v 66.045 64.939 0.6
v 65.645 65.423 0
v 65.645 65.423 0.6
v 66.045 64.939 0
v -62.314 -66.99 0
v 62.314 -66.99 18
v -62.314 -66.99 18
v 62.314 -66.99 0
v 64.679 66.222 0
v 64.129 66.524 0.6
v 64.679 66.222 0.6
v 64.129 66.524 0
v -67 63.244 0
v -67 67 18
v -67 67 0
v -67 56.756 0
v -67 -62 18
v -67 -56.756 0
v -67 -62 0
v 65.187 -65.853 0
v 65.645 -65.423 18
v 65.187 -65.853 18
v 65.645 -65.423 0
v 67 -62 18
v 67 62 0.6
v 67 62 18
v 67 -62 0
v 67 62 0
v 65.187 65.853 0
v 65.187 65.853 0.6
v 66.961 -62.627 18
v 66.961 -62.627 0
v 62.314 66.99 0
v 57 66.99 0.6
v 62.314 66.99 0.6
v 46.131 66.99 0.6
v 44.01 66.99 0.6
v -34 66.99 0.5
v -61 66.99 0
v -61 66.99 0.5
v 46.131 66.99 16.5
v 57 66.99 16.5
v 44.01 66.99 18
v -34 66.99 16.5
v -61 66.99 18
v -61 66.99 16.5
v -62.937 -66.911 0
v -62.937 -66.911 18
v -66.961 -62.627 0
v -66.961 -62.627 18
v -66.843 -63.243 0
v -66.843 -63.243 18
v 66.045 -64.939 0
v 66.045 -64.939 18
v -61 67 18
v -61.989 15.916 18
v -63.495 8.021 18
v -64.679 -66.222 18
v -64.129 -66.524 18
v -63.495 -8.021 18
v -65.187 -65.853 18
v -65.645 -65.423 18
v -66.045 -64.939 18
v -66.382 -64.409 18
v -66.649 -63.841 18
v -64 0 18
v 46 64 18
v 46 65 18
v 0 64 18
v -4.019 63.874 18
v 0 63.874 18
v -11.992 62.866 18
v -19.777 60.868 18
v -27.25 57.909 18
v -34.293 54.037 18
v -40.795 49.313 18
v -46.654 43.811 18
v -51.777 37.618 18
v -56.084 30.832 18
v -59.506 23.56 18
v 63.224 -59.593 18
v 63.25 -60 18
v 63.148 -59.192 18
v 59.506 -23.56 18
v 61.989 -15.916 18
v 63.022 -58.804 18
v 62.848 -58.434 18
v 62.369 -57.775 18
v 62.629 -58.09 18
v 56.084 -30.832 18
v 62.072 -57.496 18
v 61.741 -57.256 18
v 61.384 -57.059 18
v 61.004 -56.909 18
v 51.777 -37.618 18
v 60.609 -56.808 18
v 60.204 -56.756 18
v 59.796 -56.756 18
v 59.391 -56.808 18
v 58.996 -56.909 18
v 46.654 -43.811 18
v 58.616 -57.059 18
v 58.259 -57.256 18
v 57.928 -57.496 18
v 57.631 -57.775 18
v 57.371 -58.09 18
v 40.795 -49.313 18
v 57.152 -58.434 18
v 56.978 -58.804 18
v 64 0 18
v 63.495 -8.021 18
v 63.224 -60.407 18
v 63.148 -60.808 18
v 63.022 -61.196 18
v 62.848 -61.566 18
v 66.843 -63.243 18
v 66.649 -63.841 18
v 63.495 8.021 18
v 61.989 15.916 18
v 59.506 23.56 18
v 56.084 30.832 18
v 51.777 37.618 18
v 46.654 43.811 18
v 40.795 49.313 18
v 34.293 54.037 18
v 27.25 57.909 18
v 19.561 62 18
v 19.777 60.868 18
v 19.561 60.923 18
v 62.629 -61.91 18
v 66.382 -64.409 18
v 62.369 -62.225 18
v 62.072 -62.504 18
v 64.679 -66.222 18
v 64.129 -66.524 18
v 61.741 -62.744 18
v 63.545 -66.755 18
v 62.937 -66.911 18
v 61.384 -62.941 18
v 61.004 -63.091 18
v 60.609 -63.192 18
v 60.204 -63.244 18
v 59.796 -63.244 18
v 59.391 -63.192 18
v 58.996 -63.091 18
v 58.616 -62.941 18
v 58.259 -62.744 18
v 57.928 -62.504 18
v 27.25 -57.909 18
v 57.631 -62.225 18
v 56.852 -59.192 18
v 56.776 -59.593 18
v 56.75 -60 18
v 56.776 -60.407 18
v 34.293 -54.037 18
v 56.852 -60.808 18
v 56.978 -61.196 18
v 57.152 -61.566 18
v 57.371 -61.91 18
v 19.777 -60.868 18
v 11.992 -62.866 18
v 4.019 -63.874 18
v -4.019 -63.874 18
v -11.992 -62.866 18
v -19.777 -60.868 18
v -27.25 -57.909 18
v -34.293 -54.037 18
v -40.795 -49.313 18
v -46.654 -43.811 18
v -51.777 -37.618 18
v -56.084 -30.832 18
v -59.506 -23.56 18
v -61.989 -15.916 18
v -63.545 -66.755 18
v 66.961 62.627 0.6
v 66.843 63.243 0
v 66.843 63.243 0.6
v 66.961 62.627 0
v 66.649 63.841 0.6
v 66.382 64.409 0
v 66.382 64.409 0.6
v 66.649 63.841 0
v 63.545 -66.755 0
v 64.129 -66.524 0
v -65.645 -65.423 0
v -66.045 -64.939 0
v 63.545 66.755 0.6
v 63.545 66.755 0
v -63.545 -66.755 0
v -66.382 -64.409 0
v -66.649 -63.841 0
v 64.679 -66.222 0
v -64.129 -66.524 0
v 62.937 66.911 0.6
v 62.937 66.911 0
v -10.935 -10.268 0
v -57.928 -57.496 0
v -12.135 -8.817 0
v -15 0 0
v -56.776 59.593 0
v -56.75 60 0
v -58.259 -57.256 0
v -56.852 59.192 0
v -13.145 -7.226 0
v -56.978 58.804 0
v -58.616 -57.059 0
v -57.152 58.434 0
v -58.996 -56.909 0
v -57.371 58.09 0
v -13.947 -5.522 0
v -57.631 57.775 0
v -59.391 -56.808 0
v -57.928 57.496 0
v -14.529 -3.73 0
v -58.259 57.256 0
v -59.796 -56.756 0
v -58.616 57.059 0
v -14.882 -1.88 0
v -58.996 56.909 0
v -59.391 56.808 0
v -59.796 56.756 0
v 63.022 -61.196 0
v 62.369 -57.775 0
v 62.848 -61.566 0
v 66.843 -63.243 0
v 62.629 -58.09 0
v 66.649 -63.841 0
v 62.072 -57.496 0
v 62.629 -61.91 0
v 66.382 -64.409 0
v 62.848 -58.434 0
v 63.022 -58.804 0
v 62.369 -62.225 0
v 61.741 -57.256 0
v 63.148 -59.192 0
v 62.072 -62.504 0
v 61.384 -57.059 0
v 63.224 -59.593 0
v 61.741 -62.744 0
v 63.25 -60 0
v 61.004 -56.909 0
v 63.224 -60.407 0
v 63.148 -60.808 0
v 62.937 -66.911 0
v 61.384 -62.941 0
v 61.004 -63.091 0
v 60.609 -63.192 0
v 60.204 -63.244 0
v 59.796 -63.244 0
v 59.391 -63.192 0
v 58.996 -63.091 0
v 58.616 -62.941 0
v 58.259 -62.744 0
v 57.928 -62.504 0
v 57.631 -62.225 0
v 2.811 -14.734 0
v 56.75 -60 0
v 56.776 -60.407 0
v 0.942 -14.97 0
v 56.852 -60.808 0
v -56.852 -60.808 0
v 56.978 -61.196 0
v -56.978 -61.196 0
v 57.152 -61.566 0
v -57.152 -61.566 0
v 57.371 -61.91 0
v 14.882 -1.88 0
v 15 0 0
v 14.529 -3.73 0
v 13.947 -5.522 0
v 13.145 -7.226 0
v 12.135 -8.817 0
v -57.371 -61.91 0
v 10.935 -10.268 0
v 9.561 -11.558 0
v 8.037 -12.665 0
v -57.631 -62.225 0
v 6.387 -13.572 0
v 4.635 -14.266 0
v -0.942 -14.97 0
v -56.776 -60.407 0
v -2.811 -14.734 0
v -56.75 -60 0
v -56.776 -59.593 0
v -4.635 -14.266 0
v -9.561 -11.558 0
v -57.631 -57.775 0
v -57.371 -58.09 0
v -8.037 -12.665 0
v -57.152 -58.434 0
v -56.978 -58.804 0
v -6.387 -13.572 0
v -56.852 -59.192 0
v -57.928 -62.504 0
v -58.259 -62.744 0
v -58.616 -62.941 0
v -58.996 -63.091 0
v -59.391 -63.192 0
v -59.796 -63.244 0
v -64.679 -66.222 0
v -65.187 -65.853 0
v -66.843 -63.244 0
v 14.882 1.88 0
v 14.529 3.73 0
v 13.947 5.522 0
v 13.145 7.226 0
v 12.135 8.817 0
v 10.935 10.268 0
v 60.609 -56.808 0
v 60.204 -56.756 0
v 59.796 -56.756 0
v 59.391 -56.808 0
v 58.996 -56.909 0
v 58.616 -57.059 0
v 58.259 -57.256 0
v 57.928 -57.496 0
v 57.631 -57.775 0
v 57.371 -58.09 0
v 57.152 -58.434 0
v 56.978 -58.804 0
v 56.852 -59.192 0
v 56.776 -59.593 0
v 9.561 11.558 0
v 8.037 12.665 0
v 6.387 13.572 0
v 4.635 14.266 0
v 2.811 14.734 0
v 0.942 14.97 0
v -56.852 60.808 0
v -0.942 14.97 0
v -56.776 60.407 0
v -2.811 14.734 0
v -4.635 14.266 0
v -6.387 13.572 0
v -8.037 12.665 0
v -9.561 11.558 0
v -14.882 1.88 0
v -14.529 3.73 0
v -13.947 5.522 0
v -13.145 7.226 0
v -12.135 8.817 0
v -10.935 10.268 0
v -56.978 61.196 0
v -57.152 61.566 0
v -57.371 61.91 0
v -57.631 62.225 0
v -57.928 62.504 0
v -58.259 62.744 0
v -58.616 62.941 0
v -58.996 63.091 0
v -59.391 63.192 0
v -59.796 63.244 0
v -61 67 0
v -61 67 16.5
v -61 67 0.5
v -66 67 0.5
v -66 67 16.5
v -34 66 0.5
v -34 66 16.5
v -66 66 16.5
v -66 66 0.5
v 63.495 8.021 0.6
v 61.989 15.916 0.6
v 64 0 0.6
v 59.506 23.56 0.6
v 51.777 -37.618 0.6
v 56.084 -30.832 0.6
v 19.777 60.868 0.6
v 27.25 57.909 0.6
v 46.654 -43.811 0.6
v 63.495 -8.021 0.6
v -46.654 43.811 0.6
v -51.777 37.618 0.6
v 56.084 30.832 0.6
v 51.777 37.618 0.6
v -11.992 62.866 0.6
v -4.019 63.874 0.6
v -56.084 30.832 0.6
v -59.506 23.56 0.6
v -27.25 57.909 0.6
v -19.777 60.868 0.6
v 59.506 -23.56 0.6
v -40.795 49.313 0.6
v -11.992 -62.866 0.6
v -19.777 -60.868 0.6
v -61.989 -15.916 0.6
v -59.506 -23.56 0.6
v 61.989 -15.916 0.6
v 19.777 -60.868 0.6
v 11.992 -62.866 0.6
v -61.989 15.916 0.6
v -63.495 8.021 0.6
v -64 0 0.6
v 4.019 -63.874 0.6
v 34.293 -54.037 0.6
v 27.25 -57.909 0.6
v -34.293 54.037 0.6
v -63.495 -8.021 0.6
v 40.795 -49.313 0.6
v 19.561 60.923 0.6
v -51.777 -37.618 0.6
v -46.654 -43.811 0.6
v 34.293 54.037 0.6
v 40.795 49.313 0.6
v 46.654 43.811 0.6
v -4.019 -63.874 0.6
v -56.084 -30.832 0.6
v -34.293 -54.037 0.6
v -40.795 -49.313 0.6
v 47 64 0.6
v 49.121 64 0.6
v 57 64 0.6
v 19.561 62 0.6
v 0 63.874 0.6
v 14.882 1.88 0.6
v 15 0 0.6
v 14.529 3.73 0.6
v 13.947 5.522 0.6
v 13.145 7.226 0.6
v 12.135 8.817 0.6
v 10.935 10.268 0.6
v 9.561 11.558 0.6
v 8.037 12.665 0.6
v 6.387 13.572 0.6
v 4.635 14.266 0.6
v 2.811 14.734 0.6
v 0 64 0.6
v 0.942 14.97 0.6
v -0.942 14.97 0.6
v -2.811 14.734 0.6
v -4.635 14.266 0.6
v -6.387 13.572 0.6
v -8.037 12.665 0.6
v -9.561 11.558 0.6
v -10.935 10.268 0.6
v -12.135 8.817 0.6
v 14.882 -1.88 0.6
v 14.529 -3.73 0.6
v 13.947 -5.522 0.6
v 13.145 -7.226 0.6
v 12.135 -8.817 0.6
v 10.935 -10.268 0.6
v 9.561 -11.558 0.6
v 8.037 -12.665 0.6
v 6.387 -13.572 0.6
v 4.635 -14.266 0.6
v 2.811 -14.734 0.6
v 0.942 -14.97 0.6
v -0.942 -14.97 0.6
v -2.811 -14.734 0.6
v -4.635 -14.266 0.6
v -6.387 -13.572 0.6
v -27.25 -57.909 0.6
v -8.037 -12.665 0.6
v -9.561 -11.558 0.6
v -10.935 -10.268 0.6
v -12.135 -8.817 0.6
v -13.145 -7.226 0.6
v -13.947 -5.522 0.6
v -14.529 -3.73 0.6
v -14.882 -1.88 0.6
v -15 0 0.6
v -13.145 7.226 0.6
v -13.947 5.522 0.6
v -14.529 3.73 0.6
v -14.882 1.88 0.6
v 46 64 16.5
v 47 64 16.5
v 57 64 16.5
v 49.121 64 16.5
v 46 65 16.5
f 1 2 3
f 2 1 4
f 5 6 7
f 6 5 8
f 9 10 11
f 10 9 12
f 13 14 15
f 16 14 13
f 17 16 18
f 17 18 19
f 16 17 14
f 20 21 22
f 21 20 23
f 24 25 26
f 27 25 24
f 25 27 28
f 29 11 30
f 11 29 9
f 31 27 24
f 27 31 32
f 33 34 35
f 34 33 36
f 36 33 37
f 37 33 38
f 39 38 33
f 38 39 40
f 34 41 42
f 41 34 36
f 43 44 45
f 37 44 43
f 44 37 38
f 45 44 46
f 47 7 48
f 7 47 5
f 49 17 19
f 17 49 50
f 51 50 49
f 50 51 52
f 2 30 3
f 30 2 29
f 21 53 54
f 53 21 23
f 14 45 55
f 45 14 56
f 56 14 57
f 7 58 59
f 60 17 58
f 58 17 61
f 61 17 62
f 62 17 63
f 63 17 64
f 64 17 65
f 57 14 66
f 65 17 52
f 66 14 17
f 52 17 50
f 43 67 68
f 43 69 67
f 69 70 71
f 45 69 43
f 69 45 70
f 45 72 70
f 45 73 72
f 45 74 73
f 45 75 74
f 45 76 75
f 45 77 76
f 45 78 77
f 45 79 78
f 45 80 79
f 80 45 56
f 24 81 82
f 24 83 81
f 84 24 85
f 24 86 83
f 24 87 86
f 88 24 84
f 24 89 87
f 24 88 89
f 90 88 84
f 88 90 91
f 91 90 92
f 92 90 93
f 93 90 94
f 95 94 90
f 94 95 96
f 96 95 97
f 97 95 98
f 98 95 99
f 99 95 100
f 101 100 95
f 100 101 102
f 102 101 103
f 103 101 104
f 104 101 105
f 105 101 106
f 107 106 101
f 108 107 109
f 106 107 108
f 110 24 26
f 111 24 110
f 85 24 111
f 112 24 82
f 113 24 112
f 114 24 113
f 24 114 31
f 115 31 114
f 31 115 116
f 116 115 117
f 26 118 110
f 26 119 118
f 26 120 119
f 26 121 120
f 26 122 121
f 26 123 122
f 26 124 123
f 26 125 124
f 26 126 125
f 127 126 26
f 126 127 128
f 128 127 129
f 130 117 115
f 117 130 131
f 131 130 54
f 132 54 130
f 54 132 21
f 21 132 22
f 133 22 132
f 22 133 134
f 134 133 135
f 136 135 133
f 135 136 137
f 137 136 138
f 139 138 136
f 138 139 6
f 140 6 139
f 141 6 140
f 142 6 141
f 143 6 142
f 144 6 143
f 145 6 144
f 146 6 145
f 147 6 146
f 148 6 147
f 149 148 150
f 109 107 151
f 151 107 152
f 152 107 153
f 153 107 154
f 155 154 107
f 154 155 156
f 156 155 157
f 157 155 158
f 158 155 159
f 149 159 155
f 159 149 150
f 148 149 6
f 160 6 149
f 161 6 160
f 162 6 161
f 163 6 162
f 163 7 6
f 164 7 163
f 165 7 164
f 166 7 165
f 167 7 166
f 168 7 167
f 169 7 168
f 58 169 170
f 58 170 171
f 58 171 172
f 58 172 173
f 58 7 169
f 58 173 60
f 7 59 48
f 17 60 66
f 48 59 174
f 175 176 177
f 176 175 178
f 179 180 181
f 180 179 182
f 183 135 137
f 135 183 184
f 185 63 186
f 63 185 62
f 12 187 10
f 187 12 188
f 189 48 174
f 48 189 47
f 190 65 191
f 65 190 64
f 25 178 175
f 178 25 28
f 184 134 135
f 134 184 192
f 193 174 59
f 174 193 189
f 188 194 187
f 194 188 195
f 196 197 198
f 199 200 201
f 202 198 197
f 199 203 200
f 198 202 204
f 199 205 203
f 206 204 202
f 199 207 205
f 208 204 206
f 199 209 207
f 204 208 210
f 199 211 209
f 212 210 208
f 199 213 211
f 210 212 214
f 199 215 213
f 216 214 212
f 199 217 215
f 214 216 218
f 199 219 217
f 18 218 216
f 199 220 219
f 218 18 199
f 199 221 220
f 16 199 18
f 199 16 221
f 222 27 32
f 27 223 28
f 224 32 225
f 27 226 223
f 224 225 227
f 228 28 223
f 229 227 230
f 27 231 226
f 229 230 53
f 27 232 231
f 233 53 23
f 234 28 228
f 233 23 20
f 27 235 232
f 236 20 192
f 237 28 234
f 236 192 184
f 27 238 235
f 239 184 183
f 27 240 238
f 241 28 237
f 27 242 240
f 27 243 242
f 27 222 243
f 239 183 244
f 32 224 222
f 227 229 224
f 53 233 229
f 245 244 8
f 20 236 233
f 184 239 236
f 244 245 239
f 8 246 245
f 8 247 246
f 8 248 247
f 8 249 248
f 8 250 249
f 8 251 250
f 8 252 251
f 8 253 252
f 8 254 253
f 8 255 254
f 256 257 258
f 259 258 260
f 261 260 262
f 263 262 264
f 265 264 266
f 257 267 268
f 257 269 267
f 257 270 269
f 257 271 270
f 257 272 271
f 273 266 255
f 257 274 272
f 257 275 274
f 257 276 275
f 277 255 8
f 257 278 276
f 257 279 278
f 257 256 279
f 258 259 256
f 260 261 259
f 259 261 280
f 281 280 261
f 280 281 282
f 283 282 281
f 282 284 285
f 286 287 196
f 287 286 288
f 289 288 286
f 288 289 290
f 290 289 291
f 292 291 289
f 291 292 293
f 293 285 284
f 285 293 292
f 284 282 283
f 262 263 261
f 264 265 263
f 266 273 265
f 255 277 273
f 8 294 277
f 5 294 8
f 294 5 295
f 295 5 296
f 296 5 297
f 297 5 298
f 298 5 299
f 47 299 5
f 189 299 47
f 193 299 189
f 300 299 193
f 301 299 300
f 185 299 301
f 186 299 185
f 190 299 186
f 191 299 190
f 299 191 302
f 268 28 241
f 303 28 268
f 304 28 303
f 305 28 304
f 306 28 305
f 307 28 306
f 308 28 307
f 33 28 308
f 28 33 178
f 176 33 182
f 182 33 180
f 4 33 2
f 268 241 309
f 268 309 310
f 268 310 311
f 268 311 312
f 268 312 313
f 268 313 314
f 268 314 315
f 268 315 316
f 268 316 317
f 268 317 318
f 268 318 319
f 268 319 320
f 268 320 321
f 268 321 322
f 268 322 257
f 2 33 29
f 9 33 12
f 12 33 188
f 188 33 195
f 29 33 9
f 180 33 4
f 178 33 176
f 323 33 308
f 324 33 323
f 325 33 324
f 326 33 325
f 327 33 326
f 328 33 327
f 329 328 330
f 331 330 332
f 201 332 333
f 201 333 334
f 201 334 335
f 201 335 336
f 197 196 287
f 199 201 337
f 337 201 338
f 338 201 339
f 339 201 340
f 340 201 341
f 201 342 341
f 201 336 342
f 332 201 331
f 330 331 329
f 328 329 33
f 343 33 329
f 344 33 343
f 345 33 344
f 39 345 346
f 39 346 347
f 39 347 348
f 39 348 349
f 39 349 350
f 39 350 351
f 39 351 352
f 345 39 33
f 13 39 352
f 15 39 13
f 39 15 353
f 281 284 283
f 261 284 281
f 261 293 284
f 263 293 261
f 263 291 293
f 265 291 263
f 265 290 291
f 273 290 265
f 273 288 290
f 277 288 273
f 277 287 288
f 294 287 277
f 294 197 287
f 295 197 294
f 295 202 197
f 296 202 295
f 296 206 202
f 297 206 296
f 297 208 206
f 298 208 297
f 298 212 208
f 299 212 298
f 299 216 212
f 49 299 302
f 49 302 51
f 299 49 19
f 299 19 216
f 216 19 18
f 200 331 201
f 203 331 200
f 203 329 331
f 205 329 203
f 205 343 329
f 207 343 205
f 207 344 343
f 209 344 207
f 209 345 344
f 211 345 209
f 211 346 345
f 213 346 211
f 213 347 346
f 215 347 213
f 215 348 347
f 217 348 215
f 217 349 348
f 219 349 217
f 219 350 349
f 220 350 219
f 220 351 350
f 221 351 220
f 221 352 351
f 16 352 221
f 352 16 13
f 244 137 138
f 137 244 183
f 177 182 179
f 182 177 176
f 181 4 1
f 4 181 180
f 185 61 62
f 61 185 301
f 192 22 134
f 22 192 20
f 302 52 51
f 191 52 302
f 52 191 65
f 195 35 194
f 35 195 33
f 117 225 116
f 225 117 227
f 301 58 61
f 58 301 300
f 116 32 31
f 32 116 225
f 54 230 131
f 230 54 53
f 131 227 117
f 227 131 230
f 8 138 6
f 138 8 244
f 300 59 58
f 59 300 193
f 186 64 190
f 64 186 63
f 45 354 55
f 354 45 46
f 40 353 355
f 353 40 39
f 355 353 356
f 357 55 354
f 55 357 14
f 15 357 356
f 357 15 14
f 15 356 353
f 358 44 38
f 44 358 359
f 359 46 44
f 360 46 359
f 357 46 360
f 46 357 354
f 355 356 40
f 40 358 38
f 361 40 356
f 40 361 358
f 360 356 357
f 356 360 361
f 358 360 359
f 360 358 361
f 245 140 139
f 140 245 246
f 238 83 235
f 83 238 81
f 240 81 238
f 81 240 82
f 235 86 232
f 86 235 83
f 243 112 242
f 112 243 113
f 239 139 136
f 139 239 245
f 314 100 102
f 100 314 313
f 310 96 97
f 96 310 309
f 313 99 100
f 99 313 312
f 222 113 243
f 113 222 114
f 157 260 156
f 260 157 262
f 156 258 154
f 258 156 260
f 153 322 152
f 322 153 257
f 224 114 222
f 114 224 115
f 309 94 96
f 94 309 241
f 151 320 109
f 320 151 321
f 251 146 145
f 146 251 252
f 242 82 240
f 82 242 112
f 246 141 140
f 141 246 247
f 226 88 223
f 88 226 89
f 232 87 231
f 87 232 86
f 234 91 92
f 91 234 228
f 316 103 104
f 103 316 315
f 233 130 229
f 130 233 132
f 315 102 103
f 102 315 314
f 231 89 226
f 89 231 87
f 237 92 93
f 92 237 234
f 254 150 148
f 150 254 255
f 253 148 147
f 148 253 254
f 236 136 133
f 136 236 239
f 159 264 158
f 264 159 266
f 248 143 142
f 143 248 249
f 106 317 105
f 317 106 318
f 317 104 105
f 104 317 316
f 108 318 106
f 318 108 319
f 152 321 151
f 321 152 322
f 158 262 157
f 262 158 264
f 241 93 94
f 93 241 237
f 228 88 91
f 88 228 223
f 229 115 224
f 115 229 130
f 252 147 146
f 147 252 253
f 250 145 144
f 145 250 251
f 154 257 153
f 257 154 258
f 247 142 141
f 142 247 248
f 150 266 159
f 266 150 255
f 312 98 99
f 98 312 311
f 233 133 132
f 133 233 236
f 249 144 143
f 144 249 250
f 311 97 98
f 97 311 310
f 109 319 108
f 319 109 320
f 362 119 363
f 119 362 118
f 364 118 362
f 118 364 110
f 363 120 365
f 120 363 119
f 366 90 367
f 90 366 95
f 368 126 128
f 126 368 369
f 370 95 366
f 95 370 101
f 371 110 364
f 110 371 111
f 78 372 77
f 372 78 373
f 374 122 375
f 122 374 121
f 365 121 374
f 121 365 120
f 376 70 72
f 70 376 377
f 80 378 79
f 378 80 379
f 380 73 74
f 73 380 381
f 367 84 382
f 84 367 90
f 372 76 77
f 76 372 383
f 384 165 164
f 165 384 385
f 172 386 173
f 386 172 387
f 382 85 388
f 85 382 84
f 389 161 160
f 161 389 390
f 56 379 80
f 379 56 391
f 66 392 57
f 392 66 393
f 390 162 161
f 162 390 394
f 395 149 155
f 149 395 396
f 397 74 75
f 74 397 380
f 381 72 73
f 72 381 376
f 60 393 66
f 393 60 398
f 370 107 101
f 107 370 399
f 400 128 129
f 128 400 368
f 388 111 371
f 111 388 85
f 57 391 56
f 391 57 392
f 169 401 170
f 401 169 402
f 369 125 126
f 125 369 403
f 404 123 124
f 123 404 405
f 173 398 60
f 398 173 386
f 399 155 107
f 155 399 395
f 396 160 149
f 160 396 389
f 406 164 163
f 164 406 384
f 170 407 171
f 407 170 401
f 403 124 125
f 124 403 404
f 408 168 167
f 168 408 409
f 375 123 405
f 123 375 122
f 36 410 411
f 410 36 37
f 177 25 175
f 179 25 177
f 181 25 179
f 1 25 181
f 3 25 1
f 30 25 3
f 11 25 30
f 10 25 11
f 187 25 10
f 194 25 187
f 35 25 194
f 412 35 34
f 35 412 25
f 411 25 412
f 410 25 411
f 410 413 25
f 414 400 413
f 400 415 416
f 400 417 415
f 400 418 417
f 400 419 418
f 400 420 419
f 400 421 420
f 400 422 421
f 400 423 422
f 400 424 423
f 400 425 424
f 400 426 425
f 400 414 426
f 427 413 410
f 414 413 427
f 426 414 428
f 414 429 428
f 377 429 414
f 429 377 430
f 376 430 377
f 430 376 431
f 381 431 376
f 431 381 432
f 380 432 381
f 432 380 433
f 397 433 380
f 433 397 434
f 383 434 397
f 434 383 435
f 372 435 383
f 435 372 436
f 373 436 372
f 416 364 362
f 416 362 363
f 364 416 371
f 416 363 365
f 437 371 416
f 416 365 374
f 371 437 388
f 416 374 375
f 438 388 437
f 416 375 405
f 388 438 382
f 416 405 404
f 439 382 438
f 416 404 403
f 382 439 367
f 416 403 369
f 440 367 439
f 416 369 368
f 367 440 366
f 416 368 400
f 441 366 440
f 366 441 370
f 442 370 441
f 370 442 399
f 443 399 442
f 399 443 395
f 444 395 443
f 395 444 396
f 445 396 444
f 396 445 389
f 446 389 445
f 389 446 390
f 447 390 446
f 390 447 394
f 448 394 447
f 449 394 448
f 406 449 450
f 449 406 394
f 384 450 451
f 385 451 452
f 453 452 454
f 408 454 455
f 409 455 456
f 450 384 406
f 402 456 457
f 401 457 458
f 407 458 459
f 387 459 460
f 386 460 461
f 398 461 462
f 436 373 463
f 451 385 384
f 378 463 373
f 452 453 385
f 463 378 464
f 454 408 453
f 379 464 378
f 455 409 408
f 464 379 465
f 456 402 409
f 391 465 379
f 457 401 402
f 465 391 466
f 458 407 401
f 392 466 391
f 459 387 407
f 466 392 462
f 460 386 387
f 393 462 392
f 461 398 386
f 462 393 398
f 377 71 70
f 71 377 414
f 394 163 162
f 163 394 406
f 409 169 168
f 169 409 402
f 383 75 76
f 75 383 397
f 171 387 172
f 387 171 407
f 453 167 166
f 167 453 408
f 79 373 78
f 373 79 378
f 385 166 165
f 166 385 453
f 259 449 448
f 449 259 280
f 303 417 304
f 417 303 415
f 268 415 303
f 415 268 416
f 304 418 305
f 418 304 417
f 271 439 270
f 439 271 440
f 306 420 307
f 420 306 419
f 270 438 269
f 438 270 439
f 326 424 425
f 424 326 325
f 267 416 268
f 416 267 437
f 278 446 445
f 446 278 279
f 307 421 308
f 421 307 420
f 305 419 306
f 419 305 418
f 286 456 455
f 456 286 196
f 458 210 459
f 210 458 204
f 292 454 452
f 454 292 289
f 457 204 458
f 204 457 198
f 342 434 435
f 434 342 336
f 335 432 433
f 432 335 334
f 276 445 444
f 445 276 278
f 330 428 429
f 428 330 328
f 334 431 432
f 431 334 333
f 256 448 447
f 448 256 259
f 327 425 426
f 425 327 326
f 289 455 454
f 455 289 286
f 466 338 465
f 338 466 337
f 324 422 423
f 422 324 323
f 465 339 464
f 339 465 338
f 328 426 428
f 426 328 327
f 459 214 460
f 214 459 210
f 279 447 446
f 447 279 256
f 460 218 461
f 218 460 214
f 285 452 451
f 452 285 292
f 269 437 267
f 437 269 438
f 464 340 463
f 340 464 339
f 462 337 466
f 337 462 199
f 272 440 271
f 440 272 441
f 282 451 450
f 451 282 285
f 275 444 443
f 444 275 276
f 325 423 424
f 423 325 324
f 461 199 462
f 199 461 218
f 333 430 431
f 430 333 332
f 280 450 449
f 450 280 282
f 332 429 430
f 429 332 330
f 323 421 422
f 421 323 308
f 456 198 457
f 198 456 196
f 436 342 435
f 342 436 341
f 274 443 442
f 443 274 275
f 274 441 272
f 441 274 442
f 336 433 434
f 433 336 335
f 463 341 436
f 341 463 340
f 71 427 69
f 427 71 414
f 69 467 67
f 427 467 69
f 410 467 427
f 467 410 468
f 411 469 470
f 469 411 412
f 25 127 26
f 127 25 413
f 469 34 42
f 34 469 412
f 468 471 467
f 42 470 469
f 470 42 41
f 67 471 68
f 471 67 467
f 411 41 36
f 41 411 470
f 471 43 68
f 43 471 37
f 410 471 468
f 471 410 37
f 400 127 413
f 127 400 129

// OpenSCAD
$fn = 50;


difference() {
	union() {
		hull() {
			translate(v = [-62.0000000000, 62.0000000000, 0]) {
				cylinder(h = 18, r = 5);
			}
			translate(v = [62.0000000000, 62.0000000000, 0]) {
				cylinder(h = 18, r = 5);
			}
			translate(v = [-62.0000000000, -62.0000000000, 0]) {
				cylinder(h = 18, r = 5);
			}
			translate(v = [62.0000000000, -62.0000000000, 0]) {
				cylinder(h = 18, r = 5);
			}
		}
		translate(v = [-67.0000000000, 61.0000000000, 0]) {
			cube(size = [6, 6, 18]);
		}
	}
	union() {
		translate(v = [-67.5000000000, -60.0000000000, -250.0000000000]) {
			rotate(a = [0, 0, 0]) {
				difference() {
					union() {
						hull() {
							translate(v = [7.5000000000, 0, 0]) {
								cylinder(h = 250, r = 3.2500000000, r1 = 3.2500000000, r2 = 3.2500000000);
							}
							translate(v = [-7.5000000000, 0, 0]) {
								cylinder(h = 250, r = 3.2500000000, r1 = 3.2500000000, r2 = 3.2500000000);
							}
						}
					}
					union();
				}
			}
		}
		translate(v = [-67.5000000000, 60.0000000000, -250.0000000000]) {
			rotate(a = [0, 0, 0]) {
				difference() {
					union() {
						hull() {
							translate(v = [7.5000000000, 0, 0]) {
								cylinder(h = 250, r = 3.2500000000, r1 = 3.2500000000, r2 = 3.2500000000);
							}
							translate(v = [-7.5000000000, 0, 0]) {
								cylinder(h = 250, r = 3.2500000000, r1 = 3.2500000000, r2 = 3.2500000000);
							}
						}
					}
					union();
				}
			}
		}
		translate(v = [-66.0000000000, 66.0000000000, 0.5000000000]) {
			cube(size = [32, 1, 16]);
		}
		translate(v = [60.0000000000, -60.0000000000, -50.0000000000]) {
			cylinder(h = 100, r = 3.2500000000);
		}
		translate(v = [0, 0, 0.6000000000]) {
			cylinder(h = 20.4000000000, r = 64.0000000000);
		}
		translate(v = [0, 0, -9.0000000000]) {
			cylinder(h = 18, r = 15.0000000000);
		}
		translate(v = [0.0000000000, 62.0000000000, 0.6000000000]) {
			cube(size = [67.0000000000, 2, 20.4000000000]);
		}
		translate(v = [57.0000000000, 62.0000000000, 0.6000000000]) {
			cube(size = [10, 5, 20.4000000000]);
		}
		translate(v = [46.0000000000, 62.0000000000, 16.5000000000]) {
			cube(size = [21, 5, 1.5000000000]);
		}
		translate(v = [43.2500000000, 67.7500000000, 0.6000000000]) {
			rotate(a = [0, 0, -45]) {
				cube(size = [7.5000000000, 1.5000000000, 20.4000000000]);
			}
		}
		translate(v = [12.0610000000, 60.0000000000, 0.6000000000]) {
			cube(size = [7.5000000000, 2, 17.4000000000]);
		}
	}
}
